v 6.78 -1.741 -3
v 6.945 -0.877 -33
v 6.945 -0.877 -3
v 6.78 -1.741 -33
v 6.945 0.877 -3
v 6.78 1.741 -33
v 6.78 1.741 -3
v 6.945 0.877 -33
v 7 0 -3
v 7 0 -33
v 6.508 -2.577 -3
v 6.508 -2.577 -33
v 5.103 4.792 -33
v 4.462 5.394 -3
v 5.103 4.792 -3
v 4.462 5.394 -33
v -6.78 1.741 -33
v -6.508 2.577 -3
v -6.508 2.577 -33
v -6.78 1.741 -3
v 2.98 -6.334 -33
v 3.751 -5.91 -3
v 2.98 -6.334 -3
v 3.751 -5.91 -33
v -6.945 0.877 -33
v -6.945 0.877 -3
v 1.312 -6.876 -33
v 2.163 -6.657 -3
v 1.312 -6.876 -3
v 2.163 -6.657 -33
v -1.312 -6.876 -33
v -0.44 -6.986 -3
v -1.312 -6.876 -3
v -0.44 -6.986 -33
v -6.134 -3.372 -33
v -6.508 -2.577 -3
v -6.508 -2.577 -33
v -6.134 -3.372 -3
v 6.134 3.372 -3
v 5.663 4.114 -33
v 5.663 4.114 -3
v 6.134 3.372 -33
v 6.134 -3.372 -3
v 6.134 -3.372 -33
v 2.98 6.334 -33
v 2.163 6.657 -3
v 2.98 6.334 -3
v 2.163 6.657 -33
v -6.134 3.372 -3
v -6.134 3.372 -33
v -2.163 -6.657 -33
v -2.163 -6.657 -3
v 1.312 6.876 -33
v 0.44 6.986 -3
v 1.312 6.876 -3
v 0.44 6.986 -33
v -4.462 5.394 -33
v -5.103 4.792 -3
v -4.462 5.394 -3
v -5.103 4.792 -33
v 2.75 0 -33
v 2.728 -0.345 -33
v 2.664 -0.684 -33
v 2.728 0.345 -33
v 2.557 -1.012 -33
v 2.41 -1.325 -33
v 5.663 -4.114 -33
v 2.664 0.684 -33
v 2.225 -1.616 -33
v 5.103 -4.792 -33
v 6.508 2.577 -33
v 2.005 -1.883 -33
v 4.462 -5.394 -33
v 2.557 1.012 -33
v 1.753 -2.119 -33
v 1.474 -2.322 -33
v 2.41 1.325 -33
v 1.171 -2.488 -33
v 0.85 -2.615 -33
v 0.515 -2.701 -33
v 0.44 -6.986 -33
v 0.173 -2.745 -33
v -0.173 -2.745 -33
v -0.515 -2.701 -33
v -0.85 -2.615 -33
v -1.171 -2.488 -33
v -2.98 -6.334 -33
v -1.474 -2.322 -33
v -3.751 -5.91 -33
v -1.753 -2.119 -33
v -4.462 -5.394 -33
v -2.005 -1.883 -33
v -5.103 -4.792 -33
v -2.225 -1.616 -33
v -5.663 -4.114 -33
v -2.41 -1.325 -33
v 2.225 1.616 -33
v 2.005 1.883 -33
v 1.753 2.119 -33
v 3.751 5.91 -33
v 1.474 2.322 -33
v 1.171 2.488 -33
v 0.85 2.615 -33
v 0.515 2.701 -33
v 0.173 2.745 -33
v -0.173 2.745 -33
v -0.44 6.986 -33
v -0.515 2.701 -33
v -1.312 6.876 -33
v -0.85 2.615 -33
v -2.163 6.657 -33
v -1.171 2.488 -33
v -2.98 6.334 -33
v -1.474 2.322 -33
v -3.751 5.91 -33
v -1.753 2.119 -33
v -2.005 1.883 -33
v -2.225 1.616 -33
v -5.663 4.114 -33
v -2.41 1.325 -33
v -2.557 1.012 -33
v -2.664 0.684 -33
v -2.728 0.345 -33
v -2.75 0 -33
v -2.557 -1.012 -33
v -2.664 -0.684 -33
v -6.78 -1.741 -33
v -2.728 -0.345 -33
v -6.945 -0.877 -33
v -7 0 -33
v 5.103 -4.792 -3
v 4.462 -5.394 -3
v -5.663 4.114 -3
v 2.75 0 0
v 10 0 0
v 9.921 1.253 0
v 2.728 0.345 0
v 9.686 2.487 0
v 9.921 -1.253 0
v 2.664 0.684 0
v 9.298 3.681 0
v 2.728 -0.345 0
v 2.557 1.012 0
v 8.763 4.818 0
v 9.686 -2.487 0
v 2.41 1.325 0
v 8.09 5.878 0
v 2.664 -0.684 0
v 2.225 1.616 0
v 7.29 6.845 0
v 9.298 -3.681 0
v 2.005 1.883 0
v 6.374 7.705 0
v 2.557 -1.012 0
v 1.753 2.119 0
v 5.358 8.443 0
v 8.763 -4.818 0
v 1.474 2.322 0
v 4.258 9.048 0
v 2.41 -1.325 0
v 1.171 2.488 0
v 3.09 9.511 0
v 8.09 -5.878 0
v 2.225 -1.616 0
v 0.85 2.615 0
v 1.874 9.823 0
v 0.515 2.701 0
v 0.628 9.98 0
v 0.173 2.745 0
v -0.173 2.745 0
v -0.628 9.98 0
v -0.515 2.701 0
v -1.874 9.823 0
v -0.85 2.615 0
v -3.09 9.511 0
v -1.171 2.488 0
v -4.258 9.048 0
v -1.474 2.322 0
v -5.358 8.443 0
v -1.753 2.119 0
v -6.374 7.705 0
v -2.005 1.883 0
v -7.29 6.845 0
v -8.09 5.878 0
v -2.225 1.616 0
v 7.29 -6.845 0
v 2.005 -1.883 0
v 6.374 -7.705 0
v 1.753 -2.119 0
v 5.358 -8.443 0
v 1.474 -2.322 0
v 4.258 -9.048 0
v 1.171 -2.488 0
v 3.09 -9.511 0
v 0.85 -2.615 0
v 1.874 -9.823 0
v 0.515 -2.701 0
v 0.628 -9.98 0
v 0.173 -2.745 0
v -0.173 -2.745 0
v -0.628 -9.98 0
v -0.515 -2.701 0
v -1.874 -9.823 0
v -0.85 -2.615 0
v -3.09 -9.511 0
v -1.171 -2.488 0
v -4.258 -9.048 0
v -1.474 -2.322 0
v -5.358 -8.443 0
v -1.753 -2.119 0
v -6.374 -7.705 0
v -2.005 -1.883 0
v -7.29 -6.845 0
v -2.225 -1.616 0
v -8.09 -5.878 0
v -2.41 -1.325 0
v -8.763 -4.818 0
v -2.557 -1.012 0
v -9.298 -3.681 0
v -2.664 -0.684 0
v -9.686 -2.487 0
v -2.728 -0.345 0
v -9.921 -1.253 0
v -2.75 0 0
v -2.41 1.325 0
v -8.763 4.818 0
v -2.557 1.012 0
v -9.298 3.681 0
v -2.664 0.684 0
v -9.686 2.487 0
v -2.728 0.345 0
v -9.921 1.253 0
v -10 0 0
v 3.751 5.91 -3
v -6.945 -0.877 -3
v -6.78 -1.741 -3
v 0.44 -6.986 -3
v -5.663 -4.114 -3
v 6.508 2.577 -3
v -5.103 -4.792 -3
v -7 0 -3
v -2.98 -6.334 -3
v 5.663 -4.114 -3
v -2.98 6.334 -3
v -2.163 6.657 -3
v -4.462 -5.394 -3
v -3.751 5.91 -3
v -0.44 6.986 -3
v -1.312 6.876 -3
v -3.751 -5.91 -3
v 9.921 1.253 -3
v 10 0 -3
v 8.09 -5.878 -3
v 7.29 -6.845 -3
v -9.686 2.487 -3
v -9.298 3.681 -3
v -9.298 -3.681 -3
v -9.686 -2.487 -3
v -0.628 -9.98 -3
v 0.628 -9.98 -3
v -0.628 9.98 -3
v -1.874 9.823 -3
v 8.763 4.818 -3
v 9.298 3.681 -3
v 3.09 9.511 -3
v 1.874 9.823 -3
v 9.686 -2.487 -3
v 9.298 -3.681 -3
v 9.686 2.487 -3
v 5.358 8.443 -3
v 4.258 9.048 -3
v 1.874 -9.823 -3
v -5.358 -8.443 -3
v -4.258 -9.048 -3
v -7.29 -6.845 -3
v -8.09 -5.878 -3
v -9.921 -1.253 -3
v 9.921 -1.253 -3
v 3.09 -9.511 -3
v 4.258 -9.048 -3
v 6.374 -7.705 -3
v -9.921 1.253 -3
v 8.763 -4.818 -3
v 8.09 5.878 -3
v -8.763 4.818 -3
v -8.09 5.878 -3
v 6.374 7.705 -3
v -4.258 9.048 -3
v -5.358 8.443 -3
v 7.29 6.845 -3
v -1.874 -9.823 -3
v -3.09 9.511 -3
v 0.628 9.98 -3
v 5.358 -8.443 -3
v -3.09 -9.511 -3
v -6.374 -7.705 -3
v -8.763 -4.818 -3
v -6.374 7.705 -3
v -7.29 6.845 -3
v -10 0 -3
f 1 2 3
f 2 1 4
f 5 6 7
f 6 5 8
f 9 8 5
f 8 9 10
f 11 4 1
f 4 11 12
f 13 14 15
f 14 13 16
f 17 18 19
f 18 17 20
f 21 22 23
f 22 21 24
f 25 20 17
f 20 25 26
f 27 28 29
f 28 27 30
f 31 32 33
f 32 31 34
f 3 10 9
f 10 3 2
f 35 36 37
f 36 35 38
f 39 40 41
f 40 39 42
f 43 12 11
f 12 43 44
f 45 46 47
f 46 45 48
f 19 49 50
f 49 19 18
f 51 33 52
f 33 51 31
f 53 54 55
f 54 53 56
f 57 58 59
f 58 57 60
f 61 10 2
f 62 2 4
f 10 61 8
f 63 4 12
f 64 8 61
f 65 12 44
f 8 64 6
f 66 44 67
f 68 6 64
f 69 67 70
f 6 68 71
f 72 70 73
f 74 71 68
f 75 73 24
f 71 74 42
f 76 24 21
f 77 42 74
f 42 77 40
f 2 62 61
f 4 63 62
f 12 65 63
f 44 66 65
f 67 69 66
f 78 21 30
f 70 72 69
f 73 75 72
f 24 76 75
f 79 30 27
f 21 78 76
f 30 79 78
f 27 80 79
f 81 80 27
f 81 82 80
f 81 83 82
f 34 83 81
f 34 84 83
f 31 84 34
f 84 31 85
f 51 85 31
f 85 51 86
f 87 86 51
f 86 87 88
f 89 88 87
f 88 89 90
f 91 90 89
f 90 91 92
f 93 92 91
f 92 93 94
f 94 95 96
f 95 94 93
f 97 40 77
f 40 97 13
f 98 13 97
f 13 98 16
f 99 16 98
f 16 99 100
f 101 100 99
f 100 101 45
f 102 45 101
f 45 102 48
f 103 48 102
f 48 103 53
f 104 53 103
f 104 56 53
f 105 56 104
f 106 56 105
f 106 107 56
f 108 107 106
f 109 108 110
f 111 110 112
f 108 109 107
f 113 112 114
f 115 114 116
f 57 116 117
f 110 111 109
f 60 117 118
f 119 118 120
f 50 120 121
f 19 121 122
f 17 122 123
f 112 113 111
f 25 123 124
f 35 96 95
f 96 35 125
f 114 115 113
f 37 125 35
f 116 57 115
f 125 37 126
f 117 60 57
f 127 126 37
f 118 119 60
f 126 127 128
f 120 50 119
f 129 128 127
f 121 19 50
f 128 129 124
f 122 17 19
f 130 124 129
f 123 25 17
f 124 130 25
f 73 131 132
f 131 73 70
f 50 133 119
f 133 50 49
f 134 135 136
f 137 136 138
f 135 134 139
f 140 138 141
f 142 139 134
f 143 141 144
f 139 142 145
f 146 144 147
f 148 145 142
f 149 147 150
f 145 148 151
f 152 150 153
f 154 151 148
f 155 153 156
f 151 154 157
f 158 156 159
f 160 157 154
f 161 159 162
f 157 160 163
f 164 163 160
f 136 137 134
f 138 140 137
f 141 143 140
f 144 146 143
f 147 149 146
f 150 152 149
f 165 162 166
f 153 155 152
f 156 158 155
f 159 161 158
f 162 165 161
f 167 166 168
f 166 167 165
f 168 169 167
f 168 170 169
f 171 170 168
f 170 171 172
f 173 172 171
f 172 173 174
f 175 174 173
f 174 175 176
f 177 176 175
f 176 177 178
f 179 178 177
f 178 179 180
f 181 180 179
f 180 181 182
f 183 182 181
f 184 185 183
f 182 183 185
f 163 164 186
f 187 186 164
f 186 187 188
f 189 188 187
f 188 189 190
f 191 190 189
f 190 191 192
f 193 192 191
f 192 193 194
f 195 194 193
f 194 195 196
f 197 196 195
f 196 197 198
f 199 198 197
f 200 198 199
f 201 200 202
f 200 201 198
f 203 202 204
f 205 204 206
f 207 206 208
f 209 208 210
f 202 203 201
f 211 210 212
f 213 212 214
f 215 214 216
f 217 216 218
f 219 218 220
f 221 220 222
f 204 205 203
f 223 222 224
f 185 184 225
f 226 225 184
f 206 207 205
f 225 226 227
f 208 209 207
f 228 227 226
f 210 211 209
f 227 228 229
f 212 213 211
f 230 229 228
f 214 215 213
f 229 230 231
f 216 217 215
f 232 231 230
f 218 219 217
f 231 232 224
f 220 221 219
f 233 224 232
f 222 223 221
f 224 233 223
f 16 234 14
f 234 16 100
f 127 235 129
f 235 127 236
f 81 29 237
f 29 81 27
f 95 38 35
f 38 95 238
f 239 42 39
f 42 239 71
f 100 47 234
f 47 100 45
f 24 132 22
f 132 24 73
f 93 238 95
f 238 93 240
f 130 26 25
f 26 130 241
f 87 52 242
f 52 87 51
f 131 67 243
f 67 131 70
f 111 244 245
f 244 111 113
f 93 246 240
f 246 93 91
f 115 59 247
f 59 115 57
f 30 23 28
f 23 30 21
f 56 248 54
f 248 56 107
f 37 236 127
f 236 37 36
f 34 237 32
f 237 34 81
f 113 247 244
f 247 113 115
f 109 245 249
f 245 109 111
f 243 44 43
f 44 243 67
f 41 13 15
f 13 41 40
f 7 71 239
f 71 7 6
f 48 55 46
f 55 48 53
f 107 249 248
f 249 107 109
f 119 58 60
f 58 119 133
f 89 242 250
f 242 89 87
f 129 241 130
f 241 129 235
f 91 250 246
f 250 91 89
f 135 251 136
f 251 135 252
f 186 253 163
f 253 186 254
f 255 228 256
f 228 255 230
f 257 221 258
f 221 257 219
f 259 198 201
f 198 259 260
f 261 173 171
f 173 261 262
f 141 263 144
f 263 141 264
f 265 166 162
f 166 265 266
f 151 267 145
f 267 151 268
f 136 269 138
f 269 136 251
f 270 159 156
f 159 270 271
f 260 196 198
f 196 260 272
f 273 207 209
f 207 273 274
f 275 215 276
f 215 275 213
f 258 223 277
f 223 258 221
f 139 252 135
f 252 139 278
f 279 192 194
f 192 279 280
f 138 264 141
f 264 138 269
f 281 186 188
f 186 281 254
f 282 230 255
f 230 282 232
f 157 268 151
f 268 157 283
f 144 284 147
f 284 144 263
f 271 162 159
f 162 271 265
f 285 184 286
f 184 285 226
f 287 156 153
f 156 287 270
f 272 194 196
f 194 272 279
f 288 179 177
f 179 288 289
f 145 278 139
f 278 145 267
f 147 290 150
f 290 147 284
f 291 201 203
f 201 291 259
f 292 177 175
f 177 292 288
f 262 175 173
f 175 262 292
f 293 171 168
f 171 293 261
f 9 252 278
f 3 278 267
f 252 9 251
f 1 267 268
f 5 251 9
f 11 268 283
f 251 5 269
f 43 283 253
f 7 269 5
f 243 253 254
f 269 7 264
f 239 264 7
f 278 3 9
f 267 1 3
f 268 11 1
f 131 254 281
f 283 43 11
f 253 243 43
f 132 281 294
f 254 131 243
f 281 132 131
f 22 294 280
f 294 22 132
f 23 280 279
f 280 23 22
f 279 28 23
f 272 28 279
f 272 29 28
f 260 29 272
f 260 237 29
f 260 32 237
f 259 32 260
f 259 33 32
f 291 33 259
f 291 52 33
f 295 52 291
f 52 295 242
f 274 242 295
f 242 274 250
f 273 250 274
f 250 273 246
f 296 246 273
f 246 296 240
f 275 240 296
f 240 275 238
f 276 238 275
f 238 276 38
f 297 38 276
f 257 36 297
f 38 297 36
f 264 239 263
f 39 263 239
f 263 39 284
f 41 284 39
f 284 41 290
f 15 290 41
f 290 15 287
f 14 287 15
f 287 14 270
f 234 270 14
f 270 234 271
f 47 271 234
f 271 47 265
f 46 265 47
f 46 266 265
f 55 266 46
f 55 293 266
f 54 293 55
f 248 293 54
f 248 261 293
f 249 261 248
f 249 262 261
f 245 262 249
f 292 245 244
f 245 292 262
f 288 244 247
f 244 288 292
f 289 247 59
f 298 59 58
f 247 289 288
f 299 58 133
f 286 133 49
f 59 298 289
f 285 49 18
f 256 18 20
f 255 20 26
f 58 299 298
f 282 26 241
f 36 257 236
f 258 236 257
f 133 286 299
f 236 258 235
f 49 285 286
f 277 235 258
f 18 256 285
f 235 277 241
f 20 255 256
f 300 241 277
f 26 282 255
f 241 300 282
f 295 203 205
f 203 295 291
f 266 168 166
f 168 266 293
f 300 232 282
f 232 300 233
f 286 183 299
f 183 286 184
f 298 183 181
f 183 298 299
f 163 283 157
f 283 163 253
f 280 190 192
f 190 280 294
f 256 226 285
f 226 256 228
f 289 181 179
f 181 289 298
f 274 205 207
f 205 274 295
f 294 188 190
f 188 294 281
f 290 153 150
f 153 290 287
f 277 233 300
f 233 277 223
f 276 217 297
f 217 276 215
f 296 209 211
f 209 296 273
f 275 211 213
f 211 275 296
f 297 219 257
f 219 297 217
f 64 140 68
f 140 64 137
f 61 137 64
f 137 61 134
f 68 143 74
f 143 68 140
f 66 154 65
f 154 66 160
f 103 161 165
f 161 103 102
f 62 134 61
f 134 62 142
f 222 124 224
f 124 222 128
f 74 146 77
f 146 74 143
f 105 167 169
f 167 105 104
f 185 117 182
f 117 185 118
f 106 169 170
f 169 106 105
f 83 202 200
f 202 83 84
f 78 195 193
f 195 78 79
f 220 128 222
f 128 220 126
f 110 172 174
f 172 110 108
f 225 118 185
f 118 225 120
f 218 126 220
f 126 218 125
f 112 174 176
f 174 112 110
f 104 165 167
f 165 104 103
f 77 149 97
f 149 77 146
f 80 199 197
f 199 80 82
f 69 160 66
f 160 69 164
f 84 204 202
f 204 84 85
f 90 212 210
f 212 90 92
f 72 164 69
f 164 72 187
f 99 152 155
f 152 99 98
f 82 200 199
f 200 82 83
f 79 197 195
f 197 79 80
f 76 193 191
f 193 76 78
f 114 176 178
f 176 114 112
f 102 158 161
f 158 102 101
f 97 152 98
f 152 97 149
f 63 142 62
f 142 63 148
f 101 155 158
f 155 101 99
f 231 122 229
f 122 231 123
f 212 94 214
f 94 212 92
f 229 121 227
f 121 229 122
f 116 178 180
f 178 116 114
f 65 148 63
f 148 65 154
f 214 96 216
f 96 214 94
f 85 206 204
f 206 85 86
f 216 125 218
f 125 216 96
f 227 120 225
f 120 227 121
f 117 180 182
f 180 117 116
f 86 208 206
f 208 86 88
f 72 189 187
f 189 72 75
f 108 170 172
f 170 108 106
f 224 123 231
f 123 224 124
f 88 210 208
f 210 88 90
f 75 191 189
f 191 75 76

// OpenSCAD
$fn = 50;


difference() {
	union() {
		translate(v = [0, 0, -33.0000000000]) {
			cylinder(h = 33, r = 7.0000000000);
		}
		translate(v = [0, 0, -3.0000000000]) {
			cylinder(h = 3, r = 10.0000000000);
		}
	}
	union() {
		#translate(v = [0, 0, -33]) {
			cylinder(h = 33, r = 2.7500000000);
		}
	}
}
